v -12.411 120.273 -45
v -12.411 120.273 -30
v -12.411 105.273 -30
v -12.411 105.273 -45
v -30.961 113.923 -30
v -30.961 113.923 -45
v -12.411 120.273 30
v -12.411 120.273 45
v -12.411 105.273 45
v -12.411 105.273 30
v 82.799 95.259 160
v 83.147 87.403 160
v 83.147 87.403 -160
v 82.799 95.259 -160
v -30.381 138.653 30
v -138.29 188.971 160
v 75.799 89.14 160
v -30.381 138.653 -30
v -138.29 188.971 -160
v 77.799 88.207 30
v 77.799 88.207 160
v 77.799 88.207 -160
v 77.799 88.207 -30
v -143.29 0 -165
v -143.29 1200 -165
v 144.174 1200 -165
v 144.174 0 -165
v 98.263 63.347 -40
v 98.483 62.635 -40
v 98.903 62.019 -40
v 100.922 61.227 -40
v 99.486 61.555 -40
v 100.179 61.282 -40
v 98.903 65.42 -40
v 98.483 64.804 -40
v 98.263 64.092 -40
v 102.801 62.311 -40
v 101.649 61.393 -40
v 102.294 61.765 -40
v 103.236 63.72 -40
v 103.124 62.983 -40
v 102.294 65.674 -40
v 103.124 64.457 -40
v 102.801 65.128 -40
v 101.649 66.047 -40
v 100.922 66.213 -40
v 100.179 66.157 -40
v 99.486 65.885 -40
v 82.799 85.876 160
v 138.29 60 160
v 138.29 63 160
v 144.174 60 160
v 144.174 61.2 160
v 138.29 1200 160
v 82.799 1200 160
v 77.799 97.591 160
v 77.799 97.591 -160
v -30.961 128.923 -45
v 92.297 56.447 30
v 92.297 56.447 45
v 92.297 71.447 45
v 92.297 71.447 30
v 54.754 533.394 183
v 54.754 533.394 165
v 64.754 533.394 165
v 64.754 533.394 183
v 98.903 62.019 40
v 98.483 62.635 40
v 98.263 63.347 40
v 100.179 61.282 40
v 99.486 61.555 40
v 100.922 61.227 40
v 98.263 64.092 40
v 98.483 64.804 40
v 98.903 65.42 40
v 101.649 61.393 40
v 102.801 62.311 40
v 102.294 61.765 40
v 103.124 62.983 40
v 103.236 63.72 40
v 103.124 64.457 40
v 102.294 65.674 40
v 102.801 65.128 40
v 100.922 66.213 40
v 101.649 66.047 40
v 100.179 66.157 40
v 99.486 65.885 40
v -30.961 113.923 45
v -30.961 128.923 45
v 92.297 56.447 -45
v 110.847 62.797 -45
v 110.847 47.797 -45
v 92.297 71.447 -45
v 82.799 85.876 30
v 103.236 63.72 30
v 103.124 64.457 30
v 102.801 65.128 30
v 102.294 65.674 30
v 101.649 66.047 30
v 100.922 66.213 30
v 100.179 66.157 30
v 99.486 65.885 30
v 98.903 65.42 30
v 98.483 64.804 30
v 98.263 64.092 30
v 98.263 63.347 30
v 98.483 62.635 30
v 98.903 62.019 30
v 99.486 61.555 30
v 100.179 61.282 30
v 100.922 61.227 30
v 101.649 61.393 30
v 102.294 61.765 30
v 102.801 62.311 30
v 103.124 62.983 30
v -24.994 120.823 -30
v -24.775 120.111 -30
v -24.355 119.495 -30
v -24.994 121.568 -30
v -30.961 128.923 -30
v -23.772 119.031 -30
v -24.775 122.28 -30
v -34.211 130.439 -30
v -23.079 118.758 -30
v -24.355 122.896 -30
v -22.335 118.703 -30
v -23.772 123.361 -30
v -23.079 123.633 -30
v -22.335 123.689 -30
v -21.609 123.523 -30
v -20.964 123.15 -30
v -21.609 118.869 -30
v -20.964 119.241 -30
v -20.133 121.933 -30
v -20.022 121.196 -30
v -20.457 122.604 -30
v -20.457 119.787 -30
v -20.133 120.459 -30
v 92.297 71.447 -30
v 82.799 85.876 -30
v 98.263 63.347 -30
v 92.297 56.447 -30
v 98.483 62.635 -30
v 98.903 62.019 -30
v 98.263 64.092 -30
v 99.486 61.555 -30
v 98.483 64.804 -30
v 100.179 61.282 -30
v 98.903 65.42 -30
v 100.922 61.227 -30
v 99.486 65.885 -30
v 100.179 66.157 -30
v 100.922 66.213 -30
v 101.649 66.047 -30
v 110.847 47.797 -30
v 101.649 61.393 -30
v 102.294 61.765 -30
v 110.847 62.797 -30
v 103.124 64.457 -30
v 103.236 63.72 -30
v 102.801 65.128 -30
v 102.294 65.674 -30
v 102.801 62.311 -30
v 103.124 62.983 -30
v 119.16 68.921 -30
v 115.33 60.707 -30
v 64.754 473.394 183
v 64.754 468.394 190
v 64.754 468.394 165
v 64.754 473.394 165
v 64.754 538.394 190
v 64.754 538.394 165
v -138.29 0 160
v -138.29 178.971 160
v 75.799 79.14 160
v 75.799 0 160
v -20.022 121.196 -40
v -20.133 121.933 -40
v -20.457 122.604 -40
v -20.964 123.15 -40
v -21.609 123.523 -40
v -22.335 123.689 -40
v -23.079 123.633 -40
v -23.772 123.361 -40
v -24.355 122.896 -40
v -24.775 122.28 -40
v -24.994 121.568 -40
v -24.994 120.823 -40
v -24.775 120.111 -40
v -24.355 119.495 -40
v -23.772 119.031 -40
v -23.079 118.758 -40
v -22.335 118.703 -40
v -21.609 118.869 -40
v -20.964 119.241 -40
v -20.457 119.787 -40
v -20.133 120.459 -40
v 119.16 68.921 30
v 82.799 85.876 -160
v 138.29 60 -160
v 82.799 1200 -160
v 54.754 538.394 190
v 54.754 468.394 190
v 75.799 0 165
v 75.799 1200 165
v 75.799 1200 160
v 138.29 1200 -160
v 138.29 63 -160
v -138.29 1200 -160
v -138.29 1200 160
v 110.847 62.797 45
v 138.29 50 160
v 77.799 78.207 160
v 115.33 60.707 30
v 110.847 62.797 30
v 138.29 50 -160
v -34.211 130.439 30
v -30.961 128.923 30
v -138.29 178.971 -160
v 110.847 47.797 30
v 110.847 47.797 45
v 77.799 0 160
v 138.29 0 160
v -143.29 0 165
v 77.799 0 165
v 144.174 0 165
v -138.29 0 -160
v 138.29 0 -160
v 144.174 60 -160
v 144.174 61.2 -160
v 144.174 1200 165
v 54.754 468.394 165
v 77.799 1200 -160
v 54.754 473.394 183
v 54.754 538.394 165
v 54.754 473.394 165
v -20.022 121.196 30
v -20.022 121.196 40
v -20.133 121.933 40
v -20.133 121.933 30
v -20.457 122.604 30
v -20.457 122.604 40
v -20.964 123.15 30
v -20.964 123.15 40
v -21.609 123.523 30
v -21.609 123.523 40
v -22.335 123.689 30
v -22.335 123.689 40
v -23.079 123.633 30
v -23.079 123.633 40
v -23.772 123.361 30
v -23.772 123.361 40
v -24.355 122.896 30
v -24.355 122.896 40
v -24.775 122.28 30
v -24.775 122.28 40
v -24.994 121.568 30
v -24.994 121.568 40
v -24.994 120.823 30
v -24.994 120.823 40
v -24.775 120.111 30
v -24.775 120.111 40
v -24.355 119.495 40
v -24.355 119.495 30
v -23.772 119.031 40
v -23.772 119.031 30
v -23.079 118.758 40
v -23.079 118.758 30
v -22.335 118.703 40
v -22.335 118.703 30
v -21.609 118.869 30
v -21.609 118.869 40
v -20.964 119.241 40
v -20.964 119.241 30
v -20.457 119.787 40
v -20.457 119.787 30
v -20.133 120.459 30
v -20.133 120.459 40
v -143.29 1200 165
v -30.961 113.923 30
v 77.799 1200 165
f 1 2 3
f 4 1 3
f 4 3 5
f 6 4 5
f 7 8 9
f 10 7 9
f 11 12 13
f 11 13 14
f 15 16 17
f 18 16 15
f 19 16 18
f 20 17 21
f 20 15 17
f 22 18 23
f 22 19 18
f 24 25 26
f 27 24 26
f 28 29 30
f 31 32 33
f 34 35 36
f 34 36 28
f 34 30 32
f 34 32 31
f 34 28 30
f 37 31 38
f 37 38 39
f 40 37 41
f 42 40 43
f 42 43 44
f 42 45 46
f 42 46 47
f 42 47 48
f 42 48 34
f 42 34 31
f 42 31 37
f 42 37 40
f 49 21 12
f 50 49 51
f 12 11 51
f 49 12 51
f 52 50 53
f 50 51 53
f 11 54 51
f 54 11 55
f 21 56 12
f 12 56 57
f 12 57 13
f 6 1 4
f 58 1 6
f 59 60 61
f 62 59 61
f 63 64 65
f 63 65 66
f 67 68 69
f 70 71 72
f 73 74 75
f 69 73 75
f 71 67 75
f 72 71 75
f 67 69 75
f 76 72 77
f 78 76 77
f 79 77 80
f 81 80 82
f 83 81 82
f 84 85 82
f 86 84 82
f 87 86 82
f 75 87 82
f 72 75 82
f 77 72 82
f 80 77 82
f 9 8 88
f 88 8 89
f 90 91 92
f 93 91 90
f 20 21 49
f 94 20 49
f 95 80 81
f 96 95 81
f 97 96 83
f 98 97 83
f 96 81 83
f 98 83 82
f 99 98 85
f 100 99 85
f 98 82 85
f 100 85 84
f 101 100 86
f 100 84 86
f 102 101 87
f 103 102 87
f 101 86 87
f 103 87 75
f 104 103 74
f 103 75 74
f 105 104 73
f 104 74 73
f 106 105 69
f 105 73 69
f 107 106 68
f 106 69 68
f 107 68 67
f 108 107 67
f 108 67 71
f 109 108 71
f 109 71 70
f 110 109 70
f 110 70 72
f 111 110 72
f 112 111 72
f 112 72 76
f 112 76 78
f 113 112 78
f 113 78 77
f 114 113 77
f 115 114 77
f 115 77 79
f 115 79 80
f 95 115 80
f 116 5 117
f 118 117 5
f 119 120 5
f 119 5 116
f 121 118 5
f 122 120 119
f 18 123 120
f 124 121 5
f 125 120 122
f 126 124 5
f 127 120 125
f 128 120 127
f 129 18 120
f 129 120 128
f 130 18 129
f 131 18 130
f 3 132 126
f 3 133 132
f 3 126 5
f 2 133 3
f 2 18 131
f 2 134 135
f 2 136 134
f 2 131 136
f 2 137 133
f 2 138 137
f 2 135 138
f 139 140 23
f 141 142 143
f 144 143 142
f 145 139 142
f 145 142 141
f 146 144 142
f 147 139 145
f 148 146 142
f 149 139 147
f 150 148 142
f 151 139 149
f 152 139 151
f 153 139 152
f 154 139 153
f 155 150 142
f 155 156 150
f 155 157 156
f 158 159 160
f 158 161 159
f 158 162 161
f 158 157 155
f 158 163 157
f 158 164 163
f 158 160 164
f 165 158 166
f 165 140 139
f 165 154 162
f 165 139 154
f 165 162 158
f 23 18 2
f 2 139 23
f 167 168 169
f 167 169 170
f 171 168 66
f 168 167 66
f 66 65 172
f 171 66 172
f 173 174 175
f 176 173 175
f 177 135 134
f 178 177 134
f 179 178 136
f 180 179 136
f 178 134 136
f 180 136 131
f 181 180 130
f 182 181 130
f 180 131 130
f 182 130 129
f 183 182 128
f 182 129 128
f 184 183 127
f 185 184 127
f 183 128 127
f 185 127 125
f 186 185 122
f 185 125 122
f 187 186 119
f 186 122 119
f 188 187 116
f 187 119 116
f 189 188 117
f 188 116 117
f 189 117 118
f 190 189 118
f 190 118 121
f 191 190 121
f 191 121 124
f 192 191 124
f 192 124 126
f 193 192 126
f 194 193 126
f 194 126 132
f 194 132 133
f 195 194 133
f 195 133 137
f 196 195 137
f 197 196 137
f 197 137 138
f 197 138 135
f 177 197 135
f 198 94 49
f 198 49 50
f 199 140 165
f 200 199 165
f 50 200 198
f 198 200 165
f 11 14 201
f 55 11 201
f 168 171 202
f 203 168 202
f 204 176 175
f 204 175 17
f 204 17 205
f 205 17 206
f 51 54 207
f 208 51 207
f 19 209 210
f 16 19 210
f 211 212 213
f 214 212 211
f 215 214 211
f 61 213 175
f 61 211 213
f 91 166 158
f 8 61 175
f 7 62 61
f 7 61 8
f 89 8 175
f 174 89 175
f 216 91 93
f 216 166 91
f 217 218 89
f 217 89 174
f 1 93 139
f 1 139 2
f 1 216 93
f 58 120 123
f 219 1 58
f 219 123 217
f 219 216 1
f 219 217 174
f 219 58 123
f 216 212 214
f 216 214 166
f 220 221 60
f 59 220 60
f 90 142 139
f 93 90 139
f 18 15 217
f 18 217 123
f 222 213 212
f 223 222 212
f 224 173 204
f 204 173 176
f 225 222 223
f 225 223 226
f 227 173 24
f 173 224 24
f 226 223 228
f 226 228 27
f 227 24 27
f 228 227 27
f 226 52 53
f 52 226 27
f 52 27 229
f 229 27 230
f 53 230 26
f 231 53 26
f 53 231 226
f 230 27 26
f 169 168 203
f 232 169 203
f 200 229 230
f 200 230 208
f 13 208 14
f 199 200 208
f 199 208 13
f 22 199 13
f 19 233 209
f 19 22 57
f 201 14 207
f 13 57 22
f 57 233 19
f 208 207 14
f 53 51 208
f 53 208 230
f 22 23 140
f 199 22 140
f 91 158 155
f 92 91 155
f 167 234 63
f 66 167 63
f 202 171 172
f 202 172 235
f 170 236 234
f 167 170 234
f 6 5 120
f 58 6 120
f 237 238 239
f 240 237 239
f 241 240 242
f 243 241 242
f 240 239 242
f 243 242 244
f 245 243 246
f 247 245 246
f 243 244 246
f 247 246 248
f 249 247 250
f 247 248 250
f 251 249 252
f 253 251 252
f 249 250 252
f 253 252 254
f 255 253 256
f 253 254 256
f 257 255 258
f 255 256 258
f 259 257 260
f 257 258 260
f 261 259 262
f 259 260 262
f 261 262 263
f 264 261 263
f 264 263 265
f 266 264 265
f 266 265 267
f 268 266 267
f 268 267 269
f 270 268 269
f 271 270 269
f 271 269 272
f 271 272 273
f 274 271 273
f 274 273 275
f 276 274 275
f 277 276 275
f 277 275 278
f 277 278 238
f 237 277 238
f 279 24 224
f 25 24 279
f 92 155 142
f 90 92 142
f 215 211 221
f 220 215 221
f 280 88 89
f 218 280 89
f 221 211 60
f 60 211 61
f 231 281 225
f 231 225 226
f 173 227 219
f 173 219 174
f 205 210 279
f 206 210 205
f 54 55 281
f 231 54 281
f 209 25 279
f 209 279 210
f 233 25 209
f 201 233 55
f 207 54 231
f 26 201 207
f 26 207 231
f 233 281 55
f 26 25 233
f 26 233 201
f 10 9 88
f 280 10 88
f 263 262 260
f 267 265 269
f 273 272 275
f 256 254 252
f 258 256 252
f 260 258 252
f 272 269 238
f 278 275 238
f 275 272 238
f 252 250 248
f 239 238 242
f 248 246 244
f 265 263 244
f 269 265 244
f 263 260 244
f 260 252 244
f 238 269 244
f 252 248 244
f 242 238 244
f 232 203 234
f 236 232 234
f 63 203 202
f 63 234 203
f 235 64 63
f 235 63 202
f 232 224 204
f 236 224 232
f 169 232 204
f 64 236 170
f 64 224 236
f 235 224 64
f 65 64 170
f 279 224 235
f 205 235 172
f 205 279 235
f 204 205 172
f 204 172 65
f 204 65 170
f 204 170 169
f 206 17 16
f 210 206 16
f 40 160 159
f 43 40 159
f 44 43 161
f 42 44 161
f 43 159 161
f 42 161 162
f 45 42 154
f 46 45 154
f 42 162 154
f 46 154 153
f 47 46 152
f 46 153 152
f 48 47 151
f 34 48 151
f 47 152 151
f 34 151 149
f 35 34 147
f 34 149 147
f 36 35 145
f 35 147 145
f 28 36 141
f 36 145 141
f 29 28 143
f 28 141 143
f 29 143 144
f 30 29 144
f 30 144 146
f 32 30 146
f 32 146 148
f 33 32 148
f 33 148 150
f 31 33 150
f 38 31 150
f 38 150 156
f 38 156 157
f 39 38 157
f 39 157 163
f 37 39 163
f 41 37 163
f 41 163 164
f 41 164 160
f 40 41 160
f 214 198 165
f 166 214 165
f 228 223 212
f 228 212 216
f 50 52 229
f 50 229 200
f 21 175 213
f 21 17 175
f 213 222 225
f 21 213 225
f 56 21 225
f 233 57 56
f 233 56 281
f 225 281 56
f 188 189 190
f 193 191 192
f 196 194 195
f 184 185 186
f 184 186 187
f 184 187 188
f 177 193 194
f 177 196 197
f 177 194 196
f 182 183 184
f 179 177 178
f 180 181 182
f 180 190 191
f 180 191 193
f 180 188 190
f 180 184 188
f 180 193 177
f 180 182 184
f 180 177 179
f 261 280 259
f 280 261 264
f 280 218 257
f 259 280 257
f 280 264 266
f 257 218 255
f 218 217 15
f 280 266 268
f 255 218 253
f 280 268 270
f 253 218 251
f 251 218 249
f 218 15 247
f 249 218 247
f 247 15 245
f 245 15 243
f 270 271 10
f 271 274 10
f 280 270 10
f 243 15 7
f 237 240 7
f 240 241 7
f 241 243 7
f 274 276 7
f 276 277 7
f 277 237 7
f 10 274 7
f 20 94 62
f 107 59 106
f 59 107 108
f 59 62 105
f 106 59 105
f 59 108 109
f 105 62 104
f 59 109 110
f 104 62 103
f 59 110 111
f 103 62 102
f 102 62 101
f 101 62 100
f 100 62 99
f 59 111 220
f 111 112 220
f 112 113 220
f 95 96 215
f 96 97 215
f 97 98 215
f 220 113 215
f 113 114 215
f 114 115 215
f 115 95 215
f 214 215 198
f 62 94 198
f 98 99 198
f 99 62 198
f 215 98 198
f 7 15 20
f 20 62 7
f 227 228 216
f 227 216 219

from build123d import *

# Parameters (mm, degrees)
BOSS_EXTRUDE1_DEPTH    = 1200
BOSS_EXTRUDE2_DEPTH    = 320
CUT_EXTRUDE2_START     = 0.5
SKETCH6_W              = 165
SKETCH6_H              = 60
CUT_EXTRUDE2_DEPTH     = 10
BOSS_EXTRUDE14_DEPTH   = 15
LPATTERN1_COUNT        = 2
LPATTERN1_PITCH        = 136
LPATTERN2_COUNT        = 2
LPATTERN2_PITCH        = 75
LPATTERN2_COPY_1_DEPTH = 15
CUT_EXTRUDE5_START     = 70
SKETCH14_R             = 2.5
CUT_EXTRUDE5_DEPTH     = 80
BOSS_EXTRUDE19_DEPTH   = 320
CUT_EXTRUDE10_DEPTH    = 320
BOSS_EXTRUDE20_DEPTH   = 320
CUT_EXTRUDE11_DEPTH    = 320
CUT_EXTRUDE12_DEPTH    = 320
SKETCH32_W             = 66.375164862
SKETCH32_H             = 1200
BOSS_EXTRUDE21_DEPTH   = 5
SKETCH33_W             = 219.088897638
SKETCH33_H             = 1200
BOSS_EXTRUDE23_DEPTH   = 5
SKETCH34_W             = 10
SKETCH34_H             = 70
BOSS_EXTRUDE24_DEPTH   = 30
CUT_EXTRUDE13_REACH    = 91.42
SKETCH35_W             = 18
SKETCH35_H             = 60


with BuildPart() as part:
    # Sketch1 → Boss-Extrude1 (new body)
    with BuildSketch(Plane(origin=(0, 0, 0), x_dir=(1, 0, 0), z_dir=(0, 1, 0))):
        Polygon((-138.29, -160), (-143.29, -160), (-143.29, 165), (144.1740625, 165), (144.1740625, -160), (138.29, -160), (138.29, 160), (-138.29, 160), align=None)
    extrude(amount=BOSS_EXTRUDE1_DEPTH)

    # Sketch3 → Boss-Extrude2 (add)
    with BuildSketch(Plane.XY.offset(-160)):
        Polygon((138.29, 50), (-138.29, 178.971372093), (-138.29, 188.971372093), (138.29, 60), align=None)
    extrude(amount=BOSS_EXTRUDE2_DEPTH)

    # Sketch6 → Cut-Extrude2 (cut)
    with BuildSketch(Plane(origin=(47.680784022, 102.25177131, 0), x_dir=(0.906307787, -0.422618262, 0), z_dir=(0.422618262, 0.906307787, 0)).offset(CUT_EXTRUDE2_START)):
        with Locations((-3.631700195, 0)):
            Rectangle(SKETCH6_W, SKETCH6_H)
    extrude(amount=-CUT_EXTRUDE2_DEPTH, mode=Mode.SUBTRACT)

    # Sketch15 → Boss-Extrude14 (add)
    with BuildSketch(Plane.XY.offset(-30)):
        Polygon((-30.960803737, 128.922945932), (-12.411066849, 120.273061564), (-12.411066849, 105.273061564), (-30.960803737, 113.922945932), align=None)
    boss_extrude14 = extrude(amount=-BOSS_EXTRUDE14_DEPTH)

    # LPattern1: Boss-Extrude14 ×2
    with Locations(*[Vector(0.906307787, -0.422618262, 0) * (i * LPATTERN1_PITCH) for i in range(1, LPATTERN1_COUNT)]):
        add(boss_extrude14)

    # LPattern2: Boss-Extrude14 ×2
    with Locations(*[(0, 0, i * LPATTERN2_PITCH) for i in range(1, LPATTERN2_COUNT)]):
        add(boss_extrude14)

    # LPattern2 copy 1 sketch → LPattern2 copy 1 (add)
    with BuildSketch(Plane(origin=(123.257859037, -57.476083597, 45), x_dir=(1, 0, 0), z_dir=(0, 0, 1))):
        Polygon((-30.960803737, 128.922945932), (-12.411066849, 120.273061564), (-12.411066849, 105.273061564), (-30.960803737, 113.922945932), align=None)
    extrude(amount=-LPATTERN2_COPY_1_DEPTH)

    # Sketch14 → Cut-Extrude5 (cut)
    with BuildSketch(Plane.XY.offset(-30).offset(CUT_EXTRUDE5_START)):
        with Locations((-22.522311936, 121.195788594)):
            Circle(SKETCH14_R)
        with Locations((100.735547101, 63.719704997)):
            Circle(SKETCH14_R)
    extrude(amount=-CUT_EXTRUDE5_DEPTH, mode=Mode.SUBTRACT)

    # Sketch19 → Boss-Extrude19 (add)
    with BuildSketch(Plane.XY.offset(-160)):
        Polygon((82.798897638, 85.875925991), (82.798897638, 1200), (77.798897638, 1200), (77.798897638, 88.207464282), align=None)
    extrude(amount=BOSS_EXTRUDE19_DEPTH)

    # Sketch27 → Cut-Extrude10 (cut)
    with BuildSketch(Plane.XY.offset(160)):
        Polygon((77.798897638, 97.590680412), (82.798897638, 95.259142121), (82.798897638, 85.875925991), (77.798897638, 88.715225589), align=None)
    extrude(amount=-CUT_EXTRUDE10_DEPTH, mode=Mode.SUBTRACT)

    # Sketch28 → Boss-Extrude20 (add)
    with BuildSketch(Plane.XY.offset(160)):
        Polygon((77.798897638, 97.590680412), (83.146994647, 87.403232752), (82.798897638, 95.259142121), align=None)
    extrude(amount=-BOSS_EXTRUDE20_DEPTH)

    # Sketch29 → Cut-Extrude11 (cut)
    with BuildSketch(Plane.XY.offset(160)):
        Polygon((138.29, 60), (138.29, 63), (144.1740625, 61.2), (144.1740625, 60), align=None)
    extrude(amount=-CUT_EXTRUDE11_DEPTH, mode=Mode.SUBTRACT)

    # Sketch31 → Cut-Extrude12 (cut)
    with BuildSketch(Plane.XY.offset(160)):
        Polygon((77.798897638, 88.207464282), (82.798897638, 85.875925991), (77.798897638, 88.715225589), align=None)
    extrude(amount=-CUT_EXTRUDE12_DEPTH, mode=Mode.SUBTRACT)

    # Sketch32 → Boss-Extrude21 (add)
    with BuildSketch(Plane.XY.offset(160)):
        with Locations((110.986480069, 600)):
            Rectangle(SKETCH32_W, SKETCH32_H)
    extrude(amount=BOSS_EXTRUDE21_DEPTH)

    # Sketch33 → Boss-Extrude23 (add)
    with BuildSketch(Plane.XY.offset(160)):
        with Locations((-33.745551181, 600)):
            Rectangle(SKETCH33_W, SKETCH33_H)
    extrude(amount=BOSS_EXTRUDE23_DEPTH)

    # Sketch34 → Boss-Extrude24 (add)
    with BuildSketch(Plane(origin=(0, 0, 160), x_dir=(-1, 0, 0), z_dir=(0, 0, -1))):
        with Locations((-59.754002279, 503.393533755)):
            Rectangle(SKETCH34_W, SKETCH34_H)
    extrude(amount=-BOSS_EXTRUDE24_DEPTH)

    # Sketch35 → Cut-Extrude13 (cut, up to next)
    with BuildSketch(Plane.ZY.offset(-54.754002279), mode=Mode.PRIVATE) as cut_extrude13_sk1:
        with Locations((174, 503.393533755)):
            Rectangle(SKETCH35_W, SKETCH35_H)
    cut_extrude13_tool1 = extrude(cut_extrude13_sk1.sketch, amount=-CUT_EXTRUDE13_REACH, mode=Mode.PRIVATE) & part.part
    add(cut_extrude13_tool1.solids().sort_by_distance((54.754002, 503.393534, 174))[0], mode=Mode.SUBTRACT)


solid = part.part
